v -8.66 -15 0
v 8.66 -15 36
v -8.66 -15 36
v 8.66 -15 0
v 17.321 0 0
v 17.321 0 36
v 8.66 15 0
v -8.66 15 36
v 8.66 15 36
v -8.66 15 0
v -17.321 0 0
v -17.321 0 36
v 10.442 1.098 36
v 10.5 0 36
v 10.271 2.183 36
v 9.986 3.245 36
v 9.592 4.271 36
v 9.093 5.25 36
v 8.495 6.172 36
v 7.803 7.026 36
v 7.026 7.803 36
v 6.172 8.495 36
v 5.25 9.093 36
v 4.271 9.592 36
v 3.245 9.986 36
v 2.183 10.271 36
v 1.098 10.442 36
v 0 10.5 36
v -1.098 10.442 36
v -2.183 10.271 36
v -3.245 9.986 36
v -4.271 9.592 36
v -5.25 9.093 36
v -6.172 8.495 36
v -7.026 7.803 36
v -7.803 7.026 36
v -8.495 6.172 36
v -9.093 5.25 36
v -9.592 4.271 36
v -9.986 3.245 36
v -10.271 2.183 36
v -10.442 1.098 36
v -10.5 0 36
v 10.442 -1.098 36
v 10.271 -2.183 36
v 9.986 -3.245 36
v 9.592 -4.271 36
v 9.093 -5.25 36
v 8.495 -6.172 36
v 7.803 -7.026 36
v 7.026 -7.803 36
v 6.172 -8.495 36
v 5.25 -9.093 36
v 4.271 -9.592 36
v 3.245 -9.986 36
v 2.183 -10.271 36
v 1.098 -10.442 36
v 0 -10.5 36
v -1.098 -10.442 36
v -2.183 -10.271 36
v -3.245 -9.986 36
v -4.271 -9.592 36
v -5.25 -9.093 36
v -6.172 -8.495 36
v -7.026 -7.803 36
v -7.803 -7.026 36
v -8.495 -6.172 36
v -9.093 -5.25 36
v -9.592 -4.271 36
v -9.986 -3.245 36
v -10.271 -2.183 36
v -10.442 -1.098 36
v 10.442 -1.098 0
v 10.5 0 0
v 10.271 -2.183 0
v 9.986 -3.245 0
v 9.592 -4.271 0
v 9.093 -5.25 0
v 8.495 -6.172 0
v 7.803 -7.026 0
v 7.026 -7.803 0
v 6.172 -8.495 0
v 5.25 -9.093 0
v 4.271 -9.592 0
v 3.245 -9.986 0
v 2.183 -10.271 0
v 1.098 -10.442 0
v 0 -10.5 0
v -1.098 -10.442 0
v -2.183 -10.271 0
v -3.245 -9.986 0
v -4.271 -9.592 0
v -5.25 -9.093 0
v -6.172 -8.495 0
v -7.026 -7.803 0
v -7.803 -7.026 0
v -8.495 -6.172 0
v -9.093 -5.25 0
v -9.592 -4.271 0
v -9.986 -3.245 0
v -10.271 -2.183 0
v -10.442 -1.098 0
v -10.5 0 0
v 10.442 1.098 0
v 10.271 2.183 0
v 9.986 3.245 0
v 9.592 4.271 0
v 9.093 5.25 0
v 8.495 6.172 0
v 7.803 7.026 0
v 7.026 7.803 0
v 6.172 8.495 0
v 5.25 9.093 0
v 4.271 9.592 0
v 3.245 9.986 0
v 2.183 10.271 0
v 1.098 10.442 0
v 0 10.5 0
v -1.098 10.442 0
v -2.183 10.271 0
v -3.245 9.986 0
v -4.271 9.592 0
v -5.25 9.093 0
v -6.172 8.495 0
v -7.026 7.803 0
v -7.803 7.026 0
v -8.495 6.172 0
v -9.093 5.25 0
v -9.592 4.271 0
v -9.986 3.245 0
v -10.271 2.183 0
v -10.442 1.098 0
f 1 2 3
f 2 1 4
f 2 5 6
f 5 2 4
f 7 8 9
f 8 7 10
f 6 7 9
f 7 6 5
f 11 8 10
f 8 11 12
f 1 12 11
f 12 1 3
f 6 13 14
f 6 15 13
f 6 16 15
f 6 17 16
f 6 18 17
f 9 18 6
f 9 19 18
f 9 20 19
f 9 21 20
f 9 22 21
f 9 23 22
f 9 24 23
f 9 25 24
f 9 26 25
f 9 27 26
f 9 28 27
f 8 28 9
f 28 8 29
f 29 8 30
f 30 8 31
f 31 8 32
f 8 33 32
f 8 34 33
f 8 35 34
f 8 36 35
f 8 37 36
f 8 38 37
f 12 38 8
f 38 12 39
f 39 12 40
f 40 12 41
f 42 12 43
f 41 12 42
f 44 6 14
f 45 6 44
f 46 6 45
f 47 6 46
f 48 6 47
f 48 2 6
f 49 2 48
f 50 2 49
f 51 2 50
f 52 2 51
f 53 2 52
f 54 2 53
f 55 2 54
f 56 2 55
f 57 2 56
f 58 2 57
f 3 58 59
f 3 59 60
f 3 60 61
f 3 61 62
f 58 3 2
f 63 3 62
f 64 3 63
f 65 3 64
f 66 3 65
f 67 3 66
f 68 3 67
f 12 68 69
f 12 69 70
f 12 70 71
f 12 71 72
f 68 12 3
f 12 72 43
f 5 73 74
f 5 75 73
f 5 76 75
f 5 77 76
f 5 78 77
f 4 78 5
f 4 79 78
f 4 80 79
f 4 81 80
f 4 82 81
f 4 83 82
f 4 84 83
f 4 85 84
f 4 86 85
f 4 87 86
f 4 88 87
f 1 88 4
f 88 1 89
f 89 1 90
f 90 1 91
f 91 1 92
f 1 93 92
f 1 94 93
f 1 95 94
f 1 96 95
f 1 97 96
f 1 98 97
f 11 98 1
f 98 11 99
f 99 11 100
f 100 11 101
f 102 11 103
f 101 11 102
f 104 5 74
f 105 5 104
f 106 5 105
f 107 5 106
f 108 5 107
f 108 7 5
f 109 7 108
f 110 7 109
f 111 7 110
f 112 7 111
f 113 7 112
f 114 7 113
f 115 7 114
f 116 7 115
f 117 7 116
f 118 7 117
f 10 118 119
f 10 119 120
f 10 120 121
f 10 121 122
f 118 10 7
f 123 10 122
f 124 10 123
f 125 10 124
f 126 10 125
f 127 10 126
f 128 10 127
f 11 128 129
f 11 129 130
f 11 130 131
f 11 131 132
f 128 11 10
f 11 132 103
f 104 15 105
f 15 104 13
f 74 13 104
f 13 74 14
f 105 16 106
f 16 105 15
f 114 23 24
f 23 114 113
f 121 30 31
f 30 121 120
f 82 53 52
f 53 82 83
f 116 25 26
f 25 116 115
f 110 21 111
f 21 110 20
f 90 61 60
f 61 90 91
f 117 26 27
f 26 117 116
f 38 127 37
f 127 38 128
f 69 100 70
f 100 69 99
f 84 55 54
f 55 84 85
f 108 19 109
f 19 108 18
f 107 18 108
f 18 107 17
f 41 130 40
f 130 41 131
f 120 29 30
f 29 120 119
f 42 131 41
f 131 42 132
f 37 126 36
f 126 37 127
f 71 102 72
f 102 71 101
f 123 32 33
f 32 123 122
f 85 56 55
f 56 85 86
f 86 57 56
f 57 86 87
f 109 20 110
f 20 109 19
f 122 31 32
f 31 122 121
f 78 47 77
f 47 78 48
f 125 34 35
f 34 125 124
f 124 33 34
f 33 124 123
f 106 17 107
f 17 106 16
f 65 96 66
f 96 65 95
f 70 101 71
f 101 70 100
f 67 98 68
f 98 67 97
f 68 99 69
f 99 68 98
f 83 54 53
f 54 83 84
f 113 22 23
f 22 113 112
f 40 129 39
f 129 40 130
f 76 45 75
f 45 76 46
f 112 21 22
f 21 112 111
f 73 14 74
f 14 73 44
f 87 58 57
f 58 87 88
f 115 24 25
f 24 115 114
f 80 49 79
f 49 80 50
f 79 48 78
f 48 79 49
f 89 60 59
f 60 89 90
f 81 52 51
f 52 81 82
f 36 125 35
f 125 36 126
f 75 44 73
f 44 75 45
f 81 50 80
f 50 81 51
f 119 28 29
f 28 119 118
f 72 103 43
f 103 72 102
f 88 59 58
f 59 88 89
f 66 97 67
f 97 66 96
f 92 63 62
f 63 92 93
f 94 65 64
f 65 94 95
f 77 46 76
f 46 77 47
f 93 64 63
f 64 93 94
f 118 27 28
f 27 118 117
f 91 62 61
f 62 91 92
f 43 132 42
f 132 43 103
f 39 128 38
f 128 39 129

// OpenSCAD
// Hex spacer.
$fn = 60;
eps = 0.02;
inner_d = 21;
flat = 30;
length = 36;
difference() { cylinder(d=flat/cos(30),h=length,$fn=6); translate([0,0,-eps]) cylinder(d=inner_d,h=length+2*eps); }
